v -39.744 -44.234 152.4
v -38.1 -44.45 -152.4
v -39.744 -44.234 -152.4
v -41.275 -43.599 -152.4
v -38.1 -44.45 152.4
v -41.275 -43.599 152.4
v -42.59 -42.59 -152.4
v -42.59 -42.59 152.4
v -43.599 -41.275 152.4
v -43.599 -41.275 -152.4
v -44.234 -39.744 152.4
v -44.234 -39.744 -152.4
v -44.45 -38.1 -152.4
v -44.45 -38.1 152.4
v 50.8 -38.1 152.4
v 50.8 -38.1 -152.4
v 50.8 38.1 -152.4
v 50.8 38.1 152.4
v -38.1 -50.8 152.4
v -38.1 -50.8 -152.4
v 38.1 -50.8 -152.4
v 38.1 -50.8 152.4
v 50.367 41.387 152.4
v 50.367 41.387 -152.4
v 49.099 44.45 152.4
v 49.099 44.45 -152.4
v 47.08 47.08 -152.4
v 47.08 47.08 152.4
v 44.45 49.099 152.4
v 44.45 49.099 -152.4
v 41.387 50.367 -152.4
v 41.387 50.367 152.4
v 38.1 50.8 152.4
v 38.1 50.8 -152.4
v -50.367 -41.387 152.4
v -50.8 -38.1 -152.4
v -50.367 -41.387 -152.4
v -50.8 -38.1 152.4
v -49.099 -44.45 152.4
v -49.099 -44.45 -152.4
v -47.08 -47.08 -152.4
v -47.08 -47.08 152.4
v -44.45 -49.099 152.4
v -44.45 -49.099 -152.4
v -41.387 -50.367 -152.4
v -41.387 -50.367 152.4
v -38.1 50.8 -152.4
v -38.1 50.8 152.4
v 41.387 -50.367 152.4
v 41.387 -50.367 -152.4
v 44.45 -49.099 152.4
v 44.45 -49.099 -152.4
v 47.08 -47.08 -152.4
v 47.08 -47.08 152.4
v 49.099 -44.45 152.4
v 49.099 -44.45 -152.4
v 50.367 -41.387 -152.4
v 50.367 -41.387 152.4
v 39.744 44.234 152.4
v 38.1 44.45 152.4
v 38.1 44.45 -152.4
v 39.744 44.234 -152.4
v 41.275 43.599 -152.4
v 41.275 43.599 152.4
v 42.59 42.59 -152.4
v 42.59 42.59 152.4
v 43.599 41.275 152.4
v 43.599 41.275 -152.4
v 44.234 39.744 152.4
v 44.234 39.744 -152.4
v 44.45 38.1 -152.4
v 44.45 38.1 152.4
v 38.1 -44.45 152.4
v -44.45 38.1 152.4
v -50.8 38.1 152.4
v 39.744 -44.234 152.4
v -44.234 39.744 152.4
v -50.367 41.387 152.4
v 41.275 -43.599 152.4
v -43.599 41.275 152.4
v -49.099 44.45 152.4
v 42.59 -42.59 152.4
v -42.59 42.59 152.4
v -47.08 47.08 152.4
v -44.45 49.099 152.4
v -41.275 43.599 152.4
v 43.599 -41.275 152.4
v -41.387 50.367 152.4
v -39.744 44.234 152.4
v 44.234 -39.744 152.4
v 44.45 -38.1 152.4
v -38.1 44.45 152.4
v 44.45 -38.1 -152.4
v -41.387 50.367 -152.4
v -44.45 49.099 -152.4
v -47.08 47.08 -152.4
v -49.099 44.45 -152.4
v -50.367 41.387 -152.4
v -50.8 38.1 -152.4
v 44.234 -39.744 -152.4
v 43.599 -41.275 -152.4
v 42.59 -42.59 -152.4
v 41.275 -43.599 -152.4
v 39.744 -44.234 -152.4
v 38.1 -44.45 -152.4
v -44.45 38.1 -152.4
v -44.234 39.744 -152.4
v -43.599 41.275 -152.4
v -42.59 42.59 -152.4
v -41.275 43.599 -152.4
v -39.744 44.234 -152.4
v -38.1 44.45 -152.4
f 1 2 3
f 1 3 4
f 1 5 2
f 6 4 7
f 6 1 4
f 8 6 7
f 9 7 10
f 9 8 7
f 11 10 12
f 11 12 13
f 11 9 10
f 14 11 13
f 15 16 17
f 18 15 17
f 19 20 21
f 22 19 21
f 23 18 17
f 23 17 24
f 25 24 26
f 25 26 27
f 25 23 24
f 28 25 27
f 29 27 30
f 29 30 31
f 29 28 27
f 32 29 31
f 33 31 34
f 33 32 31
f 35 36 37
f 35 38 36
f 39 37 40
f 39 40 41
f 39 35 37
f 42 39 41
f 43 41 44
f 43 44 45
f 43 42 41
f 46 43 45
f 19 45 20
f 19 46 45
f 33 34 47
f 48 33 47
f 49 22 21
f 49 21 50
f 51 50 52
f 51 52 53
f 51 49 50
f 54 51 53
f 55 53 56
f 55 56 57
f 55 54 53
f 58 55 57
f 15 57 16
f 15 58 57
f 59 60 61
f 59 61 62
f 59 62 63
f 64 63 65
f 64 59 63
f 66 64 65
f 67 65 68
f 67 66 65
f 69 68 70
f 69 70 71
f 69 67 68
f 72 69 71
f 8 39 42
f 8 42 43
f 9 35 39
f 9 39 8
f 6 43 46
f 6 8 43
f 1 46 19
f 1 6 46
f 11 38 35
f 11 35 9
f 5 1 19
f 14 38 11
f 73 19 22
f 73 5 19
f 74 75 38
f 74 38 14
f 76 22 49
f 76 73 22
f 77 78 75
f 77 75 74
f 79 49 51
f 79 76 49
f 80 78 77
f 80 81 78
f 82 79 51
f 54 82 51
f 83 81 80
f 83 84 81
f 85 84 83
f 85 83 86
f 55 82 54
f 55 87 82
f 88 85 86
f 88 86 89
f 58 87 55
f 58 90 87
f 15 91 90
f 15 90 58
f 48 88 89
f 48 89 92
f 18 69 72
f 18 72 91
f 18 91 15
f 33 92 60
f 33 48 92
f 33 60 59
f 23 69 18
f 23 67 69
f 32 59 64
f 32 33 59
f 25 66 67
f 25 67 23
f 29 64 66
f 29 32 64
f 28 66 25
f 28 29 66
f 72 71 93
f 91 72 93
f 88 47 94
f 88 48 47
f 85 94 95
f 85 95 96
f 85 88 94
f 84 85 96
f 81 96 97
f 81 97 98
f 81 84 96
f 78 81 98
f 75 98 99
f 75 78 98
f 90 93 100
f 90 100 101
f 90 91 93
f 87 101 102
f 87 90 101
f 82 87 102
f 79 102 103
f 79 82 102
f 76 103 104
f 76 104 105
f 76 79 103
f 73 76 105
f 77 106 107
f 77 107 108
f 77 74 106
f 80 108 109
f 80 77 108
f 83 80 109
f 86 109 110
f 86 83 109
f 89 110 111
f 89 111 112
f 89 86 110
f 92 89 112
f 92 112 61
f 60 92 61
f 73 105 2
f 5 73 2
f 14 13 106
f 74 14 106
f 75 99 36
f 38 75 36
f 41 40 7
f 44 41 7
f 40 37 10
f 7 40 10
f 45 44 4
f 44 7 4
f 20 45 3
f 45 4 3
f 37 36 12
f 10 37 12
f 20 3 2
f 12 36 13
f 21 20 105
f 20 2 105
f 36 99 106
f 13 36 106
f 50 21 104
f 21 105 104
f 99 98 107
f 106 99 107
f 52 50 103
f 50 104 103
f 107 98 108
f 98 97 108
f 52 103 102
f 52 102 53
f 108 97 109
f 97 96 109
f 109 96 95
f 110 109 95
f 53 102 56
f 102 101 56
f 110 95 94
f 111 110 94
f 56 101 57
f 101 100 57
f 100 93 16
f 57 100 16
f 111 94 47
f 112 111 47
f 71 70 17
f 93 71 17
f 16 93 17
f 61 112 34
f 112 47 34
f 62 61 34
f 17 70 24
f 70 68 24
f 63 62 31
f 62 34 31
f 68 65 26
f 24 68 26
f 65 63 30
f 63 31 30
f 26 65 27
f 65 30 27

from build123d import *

# Parameters (mm, degrees)
F1_DEPTH = 152.4


with BuildPart() as f1:
    # F0 (on Top) → F1 (new body, symmetric)
    with BuildSketch(Plane.XY):
        with BuildLine():
            Line((-38.1, -50.8), (38.1, -50.8))
            ThreePointArc((38.1, -50.8), (47.0802561211, -47.0802561211), (50.8, -38.1))
            Line((50.8, -38.1), (50.8, 38.1))
            ThreePointArc((50.8, 38.1), (47.0802561211, 47.0802561211), (38.1, 50.8))
            Line((38.1, 50.8), (-38.1, 50.8))
            ThreePointArc((-38.1, 50.8), (-47.0802561211, 47.0802561211), (-50.8, 38.1))
            Line((-50.8, 38.1), (-50.8, -38.1))
            ThreePointArc((-50.8, -38.1), (-47.0802561211, -47.0802561211), (-38.1, -50.8))
        make_face()
        with BuildLine():
            ThreePointArc((38.1, 44.4499999285), (42.59012801, 42.59012801), (44.4499999285, 38.1))
            Line((44.4499999285, 38.1), (44.4499999285, -38.1))
            ThreePointArc((44.4499999285, -38.1), (42.59012801, -42.59012801), (38.1, -44.4499999285))
            Line((38.1, -44.4499999285), (-38.1, -44.4499999285))
            ThreePointArc((-38.1, -44.4499999285), (-42.59012801, -42.59012801), (-44.4499999285, -38.1))
            Line((-44.4499999285, -38.1), (-44.4499999285, 38.1))
            ThreePointArc((-44.4499999285, 38.1), (-42.59012801, 42.59012801), (-38.1, 44.4499999285))
            Line((-38.1, 44.4499999285), (38.1, 44.4499999285))
        make_face(mode=Mode.SUBTRACT)
    extrude(amount=F1_DEPTH, both=True)


solid = f1.part
